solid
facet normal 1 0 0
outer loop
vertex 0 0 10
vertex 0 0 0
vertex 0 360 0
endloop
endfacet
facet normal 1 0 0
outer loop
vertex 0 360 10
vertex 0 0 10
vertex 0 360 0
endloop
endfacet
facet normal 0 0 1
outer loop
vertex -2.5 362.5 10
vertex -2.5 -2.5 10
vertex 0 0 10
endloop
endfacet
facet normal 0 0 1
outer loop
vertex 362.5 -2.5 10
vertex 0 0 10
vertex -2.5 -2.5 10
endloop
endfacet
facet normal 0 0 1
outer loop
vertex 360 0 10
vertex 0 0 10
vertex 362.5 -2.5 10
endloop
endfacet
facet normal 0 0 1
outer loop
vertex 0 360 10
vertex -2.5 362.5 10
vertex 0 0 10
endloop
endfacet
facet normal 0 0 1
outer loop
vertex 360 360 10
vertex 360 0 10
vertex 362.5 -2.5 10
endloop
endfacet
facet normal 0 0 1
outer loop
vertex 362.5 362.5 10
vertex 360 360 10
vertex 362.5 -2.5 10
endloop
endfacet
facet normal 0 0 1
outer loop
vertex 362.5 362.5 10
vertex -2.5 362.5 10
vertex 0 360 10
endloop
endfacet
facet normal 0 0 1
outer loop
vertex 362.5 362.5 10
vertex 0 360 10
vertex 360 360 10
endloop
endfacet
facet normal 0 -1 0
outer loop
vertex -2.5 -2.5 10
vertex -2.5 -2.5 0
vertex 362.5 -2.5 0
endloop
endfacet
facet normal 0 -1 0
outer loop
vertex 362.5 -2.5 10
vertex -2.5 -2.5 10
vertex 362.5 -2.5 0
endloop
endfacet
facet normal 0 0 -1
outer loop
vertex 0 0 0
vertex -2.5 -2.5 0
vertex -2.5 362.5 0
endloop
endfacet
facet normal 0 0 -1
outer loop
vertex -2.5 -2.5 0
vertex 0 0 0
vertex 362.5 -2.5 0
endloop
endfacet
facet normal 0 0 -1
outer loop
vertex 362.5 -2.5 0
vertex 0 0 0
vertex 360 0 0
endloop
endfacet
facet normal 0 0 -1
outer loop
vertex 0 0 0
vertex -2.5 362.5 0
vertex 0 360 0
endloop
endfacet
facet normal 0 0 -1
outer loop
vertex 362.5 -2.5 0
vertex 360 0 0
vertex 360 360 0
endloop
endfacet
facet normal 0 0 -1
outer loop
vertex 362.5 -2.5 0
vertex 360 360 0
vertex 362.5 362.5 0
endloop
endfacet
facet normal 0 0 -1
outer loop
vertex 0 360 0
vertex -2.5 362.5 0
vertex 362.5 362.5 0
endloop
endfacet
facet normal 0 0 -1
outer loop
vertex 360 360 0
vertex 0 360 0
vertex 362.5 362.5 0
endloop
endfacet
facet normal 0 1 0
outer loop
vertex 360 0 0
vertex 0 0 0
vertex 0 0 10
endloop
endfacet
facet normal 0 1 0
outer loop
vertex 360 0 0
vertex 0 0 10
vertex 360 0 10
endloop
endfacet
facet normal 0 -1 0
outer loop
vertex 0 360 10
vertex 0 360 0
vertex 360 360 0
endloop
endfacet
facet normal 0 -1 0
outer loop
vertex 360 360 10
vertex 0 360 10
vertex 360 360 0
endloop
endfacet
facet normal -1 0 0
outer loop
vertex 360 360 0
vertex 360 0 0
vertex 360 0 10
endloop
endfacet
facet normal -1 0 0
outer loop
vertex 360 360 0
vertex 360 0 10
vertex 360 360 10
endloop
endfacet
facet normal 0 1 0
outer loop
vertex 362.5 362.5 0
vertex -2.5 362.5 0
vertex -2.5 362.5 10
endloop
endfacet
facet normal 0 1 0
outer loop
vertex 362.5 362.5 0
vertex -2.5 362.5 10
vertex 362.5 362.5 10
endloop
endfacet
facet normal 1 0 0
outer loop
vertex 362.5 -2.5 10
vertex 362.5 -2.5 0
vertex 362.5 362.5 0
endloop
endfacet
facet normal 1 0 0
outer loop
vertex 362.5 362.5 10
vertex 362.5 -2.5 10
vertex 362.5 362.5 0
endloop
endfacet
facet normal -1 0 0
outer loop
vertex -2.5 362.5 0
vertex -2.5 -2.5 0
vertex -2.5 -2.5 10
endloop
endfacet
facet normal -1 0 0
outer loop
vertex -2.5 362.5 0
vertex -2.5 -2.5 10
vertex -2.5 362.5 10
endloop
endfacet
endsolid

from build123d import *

# Parameters (mm, degrees)
BOX065_W     = 360
BOX065_H     = 360
BOX065_DEPTH = 10
BOX064_W     = 365
BOX064_H     = 365
BOX064_DEPTH = 10


with BuildPart() as cube001:
    # Box065 → Box065 (new body)
    with BuildSketch(Plane(origin=(2.5, 2.5, 0), x_dir=(1, 0, 0), z_dir=(0, 0, 1))):
        with Locations((180, 180)):
            Rectangle(BOX065_W, BOX065_H)
    extrude(amount=BOX065_DEPTH)


with BuildPart() as cut:
    # Box064 → Box064 (new body)
    with BuildSketch(Plane.XY):
        with Locations((182.5, 182.5)):
            Rectangle(BOX064_W, BOX064_H)
    extrude(amount=BOX064_DEPTH)

    # Cut: cut Cube001
    add(cube001.part, mode=Mode.SUBTRACT)


with BuildPart() as cut_1:
    # Cut placement: moved
    add(cut.part.moved(Location((-2.5, -2.5, 0))))


solid = cut_1.part
